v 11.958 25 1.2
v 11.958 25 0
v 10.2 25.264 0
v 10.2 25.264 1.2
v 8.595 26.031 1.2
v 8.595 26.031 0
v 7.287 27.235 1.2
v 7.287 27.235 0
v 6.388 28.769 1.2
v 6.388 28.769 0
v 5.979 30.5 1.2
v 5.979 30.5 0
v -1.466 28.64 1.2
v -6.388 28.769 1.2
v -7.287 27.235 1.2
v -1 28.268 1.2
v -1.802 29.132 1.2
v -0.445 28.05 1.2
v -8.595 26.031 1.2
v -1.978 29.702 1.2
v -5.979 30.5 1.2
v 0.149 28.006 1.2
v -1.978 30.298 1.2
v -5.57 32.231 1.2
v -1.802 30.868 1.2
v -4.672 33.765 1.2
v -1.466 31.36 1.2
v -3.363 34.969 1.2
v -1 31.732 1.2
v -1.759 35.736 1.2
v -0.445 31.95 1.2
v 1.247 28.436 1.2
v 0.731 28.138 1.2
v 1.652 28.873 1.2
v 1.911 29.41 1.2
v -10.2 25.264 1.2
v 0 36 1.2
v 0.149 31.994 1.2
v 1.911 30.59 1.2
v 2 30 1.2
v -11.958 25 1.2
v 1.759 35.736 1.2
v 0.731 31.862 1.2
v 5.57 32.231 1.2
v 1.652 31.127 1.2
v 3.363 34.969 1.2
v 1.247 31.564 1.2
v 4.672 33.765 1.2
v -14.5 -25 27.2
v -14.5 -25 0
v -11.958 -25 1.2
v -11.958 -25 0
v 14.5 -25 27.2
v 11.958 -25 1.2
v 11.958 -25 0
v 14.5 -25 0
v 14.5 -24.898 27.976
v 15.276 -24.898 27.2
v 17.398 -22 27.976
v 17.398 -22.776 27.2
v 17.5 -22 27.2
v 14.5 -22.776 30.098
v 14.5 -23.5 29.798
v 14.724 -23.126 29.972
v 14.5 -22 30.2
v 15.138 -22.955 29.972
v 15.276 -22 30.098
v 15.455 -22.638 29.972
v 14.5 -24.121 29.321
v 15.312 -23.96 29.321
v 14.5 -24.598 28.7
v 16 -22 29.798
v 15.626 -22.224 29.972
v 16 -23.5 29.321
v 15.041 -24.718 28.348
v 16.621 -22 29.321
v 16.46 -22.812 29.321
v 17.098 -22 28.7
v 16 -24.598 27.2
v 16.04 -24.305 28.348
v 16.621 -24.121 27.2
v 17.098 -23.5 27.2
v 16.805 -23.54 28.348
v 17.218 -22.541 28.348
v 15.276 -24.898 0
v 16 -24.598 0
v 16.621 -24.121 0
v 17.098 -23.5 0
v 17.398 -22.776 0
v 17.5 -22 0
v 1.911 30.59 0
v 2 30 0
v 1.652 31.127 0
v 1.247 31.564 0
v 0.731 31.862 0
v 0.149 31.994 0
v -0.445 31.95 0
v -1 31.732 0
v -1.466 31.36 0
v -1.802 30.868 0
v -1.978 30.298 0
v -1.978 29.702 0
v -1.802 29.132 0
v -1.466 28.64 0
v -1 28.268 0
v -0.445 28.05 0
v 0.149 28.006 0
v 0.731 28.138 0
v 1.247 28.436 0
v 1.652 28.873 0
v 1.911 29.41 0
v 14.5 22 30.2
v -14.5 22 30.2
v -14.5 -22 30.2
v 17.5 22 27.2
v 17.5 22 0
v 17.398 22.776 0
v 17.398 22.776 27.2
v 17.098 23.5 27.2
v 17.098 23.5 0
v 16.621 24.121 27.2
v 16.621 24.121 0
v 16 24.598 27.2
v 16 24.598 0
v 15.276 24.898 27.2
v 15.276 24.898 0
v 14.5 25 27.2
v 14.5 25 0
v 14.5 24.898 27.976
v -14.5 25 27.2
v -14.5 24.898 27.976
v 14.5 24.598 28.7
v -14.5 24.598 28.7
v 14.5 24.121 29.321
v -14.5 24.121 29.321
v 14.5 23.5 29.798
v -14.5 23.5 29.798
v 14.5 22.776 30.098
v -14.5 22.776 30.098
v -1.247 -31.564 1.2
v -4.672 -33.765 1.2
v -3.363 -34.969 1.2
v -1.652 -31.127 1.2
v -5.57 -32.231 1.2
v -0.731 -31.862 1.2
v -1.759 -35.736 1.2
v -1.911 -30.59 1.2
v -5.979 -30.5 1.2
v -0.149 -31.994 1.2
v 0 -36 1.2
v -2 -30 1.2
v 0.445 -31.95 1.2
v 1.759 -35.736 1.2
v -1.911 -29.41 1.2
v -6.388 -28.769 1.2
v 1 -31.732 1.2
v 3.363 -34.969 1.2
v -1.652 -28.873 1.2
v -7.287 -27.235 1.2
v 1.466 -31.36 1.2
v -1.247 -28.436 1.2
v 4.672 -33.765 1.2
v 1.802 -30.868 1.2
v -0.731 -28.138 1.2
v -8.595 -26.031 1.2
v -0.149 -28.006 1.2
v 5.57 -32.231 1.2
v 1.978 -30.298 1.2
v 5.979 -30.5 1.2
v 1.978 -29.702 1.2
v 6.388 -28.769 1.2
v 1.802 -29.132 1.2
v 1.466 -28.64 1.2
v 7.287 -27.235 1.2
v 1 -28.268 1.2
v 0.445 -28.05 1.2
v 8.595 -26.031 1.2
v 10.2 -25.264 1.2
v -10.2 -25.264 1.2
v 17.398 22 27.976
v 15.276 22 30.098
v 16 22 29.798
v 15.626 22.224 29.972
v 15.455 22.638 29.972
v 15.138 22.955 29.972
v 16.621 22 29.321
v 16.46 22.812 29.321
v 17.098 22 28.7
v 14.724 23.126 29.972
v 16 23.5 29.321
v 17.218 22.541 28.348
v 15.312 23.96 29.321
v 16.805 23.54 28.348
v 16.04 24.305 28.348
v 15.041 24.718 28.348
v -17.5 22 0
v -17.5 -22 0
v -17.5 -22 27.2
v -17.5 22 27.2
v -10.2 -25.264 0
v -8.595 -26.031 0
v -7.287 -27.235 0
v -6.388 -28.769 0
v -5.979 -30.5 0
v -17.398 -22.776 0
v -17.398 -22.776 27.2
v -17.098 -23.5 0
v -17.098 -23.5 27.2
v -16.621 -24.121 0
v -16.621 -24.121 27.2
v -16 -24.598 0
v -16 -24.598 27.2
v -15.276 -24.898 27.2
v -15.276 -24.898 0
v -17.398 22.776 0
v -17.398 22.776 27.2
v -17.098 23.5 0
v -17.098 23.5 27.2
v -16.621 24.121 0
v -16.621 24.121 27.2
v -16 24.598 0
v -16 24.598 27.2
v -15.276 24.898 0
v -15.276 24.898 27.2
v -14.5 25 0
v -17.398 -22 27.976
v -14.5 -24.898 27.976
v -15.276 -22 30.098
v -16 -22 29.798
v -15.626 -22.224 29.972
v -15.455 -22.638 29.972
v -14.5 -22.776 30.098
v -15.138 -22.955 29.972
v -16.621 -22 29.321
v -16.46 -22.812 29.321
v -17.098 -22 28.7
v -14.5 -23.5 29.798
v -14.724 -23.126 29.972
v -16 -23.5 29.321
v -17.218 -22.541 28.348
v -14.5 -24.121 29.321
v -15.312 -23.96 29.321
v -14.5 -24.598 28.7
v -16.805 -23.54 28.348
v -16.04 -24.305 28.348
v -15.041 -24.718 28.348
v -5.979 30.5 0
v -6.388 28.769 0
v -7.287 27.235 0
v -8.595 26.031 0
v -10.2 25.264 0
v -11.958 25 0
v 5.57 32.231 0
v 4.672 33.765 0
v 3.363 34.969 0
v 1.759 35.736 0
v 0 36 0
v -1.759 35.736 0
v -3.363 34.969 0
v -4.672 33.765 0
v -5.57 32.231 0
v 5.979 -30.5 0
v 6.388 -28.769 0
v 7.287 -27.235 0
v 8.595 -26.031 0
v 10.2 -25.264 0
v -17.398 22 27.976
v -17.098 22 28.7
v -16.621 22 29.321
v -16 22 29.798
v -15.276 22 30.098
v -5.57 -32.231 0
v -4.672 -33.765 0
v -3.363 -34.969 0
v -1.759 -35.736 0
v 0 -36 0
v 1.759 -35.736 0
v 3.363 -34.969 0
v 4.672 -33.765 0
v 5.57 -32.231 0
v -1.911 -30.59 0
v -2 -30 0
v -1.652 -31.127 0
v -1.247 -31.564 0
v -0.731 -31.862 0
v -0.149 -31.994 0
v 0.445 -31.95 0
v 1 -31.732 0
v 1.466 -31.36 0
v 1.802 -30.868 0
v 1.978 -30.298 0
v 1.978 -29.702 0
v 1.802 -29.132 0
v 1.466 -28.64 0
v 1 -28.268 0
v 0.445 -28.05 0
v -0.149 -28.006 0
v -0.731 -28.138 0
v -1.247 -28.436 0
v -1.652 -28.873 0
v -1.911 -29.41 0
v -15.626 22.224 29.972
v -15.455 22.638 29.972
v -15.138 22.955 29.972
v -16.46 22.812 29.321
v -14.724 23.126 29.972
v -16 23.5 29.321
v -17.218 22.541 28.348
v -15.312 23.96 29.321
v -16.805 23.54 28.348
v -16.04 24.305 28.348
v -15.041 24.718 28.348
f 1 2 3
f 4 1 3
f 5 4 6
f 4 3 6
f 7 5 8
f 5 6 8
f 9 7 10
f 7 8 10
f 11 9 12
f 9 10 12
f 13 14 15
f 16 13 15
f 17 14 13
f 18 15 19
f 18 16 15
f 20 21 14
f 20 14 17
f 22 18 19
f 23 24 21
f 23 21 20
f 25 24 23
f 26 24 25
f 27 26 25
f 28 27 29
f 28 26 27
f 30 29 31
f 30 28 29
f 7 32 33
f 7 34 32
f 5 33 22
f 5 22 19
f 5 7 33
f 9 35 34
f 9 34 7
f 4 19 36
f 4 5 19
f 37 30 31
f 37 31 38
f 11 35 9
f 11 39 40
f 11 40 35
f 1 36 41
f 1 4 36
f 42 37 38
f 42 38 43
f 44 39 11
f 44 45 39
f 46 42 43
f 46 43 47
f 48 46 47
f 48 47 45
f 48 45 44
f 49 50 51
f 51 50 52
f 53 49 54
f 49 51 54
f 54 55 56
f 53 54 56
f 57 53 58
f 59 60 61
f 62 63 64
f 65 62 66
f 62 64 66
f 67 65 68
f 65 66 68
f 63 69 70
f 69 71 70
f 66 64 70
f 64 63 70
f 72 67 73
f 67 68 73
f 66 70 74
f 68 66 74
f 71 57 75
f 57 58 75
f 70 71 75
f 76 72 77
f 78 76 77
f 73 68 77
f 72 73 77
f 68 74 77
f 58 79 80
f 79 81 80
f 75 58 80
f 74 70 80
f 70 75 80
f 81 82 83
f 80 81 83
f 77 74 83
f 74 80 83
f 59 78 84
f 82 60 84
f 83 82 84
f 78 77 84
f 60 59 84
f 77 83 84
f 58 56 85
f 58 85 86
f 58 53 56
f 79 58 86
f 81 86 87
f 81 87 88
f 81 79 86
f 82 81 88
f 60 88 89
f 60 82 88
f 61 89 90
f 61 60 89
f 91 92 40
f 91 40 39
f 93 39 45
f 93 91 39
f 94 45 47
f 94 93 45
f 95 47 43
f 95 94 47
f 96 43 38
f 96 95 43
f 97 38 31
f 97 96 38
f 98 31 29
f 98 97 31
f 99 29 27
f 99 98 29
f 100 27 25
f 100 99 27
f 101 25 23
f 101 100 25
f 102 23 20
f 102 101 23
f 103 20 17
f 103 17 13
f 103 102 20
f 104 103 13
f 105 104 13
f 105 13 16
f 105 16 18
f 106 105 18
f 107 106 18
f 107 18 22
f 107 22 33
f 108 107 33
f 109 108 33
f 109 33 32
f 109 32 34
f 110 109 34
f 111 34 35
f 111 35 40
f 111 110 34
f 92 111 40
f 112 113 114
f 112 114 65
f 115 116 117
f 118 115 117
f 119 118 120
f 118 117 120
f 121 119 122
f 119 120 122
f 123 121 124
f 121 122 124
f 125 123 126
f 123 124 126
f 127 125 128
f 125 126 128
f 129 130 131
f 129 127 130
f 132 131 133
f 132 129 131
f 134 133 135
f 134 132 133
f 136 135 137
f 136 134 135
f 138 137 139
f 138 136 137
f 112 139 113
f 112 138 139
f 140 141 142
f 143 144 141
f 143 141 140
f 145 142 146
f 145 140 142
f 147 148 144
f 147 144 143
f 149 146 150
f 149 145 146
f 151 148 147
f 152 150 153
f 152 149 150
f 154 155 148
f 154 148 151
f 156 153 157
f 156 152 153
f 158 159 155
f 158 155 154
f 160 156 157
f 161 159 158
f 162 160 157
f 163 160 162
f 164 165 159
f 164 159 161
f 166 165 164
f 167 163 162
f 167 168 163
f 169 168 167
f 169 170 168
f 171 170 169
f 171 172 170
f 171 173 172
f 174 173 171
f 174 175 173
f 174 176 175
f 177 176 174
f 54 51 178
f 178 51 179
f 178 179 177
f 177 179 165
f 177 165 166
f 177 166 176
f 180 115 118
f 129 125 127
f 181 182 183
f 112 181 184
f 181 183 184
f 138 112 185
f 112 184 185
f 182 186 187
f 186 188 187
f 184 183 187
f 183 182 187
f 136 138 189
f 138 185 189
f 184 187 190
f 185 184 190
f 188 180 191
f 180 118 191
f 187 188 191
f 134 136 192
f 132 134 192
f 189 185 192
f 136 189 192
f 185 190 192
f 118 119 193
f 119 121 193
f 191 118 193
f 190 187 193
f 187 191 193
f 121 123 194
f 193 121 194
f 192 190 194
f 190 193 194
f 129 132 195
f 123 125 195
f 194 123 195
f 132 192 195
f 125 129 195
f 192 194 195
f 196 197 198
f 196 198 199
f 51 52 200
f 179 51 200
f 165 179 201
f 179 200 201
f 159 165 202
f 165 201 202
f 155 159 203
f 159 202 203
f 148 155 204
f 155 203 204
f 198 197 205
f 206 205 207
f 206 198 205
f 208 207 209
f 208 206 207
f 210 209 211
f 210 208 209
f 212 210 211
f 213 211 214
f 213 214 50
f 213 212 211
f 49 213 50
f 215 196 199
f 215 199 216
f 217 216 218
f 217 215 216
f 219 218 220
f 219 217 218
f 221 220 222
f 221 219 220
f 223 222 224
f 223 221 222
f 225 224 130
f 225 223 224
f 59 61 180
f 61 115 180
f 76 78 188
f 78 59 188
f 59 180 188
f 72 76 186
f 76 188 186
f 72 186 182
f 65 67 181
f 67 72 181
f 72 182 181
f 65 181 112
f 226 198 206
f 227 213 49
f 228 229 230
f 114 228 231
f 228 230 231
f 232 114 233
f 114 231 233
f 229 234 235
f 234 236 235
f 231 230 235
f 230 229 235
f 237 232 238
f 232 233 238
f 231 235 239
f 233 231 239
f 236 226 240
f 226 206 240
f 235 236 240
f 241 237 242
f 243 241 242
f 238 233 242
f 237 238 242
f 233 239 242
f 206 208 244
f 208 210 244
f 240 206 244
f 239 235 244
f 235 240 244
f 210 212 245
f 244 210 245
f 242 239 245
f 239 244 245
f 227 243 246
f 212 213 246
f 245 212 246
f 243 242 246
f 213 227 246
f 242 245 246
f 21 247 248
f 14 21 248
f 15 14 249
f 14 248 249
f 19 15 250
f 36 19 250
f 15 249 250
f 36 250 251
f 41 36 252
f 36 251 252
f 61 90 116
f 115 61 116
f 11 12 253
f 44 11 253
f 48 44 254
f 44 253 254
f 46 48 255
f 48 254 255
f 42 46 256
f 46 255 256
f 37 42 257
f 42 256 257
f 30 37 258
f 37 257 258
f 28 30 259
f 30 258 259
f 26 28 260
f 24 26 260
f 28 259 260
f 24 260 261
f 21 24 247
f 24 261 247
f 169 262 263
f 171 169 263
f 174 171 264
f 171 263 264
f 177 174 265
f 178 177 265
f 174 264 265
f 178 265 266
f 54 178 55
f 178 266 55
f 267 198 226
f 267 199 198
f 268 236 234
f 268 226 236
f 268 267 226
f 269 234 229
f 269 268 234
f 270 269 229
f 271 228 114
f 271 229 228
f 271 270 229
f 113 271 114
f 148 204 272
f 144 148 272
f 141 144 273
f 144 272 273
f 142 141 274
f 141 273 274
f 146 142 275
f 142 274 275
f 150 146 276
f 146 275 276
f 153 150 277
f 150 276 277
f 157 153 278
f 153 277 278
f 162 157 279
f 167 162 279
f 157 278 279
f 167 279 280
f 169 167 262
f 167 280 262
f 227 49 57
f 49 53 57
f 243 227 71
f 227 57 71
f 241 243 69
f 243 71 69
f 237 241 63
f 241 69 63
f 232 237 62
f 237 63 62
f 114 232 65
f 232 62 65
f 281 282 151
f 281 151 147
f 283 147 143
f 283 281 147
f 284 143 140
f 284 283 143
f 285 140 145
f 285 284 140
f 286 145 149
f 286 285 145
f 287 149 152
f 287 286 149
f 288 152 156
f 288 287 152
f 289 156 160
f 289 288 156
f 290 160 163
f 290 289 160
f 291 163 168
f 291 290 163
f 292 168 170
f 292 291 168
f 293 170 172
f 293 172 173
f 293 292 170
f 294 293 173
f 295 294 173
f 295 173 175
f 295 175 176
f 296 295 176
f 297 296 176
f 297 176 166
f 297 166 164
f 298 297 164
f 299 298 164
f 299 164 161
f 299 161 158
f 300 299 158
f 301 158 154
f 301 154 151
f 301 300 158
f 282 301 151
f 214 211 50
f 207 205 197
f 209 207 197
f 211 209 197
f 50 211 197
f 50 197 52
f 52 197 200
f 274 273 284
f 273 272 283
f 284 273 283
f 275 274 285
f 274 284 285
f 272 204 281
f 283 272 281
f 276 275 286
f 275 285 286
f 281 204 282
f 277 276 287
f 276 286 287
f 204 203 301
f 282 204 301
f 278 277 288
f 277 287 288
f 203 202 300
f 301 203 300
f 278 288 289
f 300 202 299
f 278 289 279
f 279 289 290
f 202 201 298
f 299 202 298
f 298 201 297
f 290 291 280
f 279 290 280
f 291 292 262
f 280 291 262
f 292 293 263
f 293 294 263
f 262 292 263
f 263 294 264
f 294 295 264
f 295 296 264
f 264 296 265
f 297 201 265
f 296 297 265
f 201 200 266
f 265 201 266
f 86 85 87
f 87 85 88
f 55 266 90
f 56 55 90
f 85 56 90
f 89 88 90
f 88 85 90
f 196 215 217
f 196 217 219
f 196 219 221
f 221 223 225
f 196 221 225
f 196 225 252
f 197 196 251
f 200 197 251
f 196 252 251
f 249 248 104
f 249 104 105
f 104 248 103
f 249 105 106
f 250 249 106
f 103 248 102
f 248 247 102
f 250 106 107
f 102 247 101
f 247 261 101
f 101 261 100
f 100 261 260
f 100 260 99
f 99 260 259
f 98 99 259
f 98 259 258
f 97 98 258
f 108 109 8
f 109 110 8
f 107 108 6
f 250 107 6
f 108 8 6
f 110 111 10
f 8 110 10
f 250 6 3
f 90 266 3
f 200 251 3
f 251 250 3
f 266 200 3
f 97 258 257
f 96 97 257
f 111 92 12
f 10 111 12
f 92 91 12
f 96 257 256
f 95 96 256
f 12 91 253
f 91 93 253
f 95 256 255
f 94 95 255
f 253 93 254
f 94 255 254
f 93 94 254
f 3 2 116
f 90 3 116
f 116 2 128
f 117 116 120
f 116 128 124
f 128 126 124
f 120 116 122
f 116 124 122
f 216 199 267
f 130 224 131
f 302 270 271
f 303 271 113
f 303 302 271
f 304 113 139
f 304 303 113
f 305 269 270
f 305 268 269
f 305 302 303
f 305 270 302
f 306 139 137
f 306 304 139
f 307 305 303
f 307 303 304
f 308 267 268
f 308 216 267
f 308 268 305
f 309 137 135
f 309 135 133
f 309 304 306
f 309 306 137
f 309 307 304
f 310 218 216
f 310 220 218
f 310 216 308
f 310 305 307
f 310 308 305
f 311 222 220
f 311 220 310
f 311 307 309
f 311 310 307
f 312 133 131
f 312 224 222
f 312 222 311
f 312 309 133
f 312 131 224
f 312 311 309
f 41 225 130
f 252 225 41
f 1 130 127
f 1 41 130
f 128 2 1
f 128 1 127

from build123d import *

# Parameters (mm, degrees)
SKETCH_1_R      = 2
EXTRUDE_1_DEPTH = 1.2
SKETCH_5_W      = 35
SKETCH_5_H      = 50
EXTRUDE_2_DEPTH = 29
FILLET_1_R      = 3


with BuildPart() as part:
    # 草图1 → 拉伸1 (new body)
    with BuildSketch(Plane.XY):
        with BuildLine():
            Line((-11.958260743, 25), (-17.5, 25))
            Line((-17.5, 25), (-17.5, -25))
            Line((-17.5, -25), (-11.958260743, -25))
            ThreePointArc((-11.958260743, -25), (-7.896241541, -26.584119567), (-5.979130372, -30.5))
            ThreePointArc((-5.979130372, -30.5), (0, -36), (5.979130372, -30.5))
            ThreePointArc((5.979130372, -30.5), (7.896241541, -26.584119567), (11.958260743, -25))
            Line((11.958260743, -25), (17.5, -25))
            Line((17.5, -25), (17.5, 25))
            Line((17.5, 25), (11.958260743, 25))
            ThreePointArc((11.958260743, 25), (7.896241541, 26.584119567), (5.979130372, 30.5))
            ThreePointArc((5.979130372, 30.5), (0, 36), (-5.979130372, 30.5))
            ThreePointArc((-5.979130372, 30.5), (-7.896241541, 26.584119567), (-11.958260743, 25))
        make_face()
        with Locations((0, 30)):
            Circle(SKETCH_1_R, mode=Mode.SUBTRACT)
        with Locations(Location((0, -30, 0), (0, 0, 180))):
            Circle(SKETCH_1_R, mode=Mode.SUBTRACT)
    extrude(amount=EXTRUDE_1_DEPTH)

    # 草图5 → 拉伸2 (add)
    with BuildSketch(Plane.XY.offset(1.2)):
        Rectangle(SKETCH_5_W, SKETCH_5_H)
    extrude(amount=EXTRUDE_2_DEPTH)

    # 圆角1
    fillet_1_edges = [part.edges().sort_by_distance(p)[0] for p in [
        (17.5, 25, 15.1),
        (17.5, -25, 15.1),
        (-17.5, -25, 15.1),
        (-17.5, 25, 15.1),
        (-17.5, 0, 30.2),
        (0, -25, 30.2),
        (17.5, 0, 30.2),
        (0, 25, 30.2),
    ]]
    fillet(fillet_1_edges, radius=FILLET_1_R)


solid = part.part
